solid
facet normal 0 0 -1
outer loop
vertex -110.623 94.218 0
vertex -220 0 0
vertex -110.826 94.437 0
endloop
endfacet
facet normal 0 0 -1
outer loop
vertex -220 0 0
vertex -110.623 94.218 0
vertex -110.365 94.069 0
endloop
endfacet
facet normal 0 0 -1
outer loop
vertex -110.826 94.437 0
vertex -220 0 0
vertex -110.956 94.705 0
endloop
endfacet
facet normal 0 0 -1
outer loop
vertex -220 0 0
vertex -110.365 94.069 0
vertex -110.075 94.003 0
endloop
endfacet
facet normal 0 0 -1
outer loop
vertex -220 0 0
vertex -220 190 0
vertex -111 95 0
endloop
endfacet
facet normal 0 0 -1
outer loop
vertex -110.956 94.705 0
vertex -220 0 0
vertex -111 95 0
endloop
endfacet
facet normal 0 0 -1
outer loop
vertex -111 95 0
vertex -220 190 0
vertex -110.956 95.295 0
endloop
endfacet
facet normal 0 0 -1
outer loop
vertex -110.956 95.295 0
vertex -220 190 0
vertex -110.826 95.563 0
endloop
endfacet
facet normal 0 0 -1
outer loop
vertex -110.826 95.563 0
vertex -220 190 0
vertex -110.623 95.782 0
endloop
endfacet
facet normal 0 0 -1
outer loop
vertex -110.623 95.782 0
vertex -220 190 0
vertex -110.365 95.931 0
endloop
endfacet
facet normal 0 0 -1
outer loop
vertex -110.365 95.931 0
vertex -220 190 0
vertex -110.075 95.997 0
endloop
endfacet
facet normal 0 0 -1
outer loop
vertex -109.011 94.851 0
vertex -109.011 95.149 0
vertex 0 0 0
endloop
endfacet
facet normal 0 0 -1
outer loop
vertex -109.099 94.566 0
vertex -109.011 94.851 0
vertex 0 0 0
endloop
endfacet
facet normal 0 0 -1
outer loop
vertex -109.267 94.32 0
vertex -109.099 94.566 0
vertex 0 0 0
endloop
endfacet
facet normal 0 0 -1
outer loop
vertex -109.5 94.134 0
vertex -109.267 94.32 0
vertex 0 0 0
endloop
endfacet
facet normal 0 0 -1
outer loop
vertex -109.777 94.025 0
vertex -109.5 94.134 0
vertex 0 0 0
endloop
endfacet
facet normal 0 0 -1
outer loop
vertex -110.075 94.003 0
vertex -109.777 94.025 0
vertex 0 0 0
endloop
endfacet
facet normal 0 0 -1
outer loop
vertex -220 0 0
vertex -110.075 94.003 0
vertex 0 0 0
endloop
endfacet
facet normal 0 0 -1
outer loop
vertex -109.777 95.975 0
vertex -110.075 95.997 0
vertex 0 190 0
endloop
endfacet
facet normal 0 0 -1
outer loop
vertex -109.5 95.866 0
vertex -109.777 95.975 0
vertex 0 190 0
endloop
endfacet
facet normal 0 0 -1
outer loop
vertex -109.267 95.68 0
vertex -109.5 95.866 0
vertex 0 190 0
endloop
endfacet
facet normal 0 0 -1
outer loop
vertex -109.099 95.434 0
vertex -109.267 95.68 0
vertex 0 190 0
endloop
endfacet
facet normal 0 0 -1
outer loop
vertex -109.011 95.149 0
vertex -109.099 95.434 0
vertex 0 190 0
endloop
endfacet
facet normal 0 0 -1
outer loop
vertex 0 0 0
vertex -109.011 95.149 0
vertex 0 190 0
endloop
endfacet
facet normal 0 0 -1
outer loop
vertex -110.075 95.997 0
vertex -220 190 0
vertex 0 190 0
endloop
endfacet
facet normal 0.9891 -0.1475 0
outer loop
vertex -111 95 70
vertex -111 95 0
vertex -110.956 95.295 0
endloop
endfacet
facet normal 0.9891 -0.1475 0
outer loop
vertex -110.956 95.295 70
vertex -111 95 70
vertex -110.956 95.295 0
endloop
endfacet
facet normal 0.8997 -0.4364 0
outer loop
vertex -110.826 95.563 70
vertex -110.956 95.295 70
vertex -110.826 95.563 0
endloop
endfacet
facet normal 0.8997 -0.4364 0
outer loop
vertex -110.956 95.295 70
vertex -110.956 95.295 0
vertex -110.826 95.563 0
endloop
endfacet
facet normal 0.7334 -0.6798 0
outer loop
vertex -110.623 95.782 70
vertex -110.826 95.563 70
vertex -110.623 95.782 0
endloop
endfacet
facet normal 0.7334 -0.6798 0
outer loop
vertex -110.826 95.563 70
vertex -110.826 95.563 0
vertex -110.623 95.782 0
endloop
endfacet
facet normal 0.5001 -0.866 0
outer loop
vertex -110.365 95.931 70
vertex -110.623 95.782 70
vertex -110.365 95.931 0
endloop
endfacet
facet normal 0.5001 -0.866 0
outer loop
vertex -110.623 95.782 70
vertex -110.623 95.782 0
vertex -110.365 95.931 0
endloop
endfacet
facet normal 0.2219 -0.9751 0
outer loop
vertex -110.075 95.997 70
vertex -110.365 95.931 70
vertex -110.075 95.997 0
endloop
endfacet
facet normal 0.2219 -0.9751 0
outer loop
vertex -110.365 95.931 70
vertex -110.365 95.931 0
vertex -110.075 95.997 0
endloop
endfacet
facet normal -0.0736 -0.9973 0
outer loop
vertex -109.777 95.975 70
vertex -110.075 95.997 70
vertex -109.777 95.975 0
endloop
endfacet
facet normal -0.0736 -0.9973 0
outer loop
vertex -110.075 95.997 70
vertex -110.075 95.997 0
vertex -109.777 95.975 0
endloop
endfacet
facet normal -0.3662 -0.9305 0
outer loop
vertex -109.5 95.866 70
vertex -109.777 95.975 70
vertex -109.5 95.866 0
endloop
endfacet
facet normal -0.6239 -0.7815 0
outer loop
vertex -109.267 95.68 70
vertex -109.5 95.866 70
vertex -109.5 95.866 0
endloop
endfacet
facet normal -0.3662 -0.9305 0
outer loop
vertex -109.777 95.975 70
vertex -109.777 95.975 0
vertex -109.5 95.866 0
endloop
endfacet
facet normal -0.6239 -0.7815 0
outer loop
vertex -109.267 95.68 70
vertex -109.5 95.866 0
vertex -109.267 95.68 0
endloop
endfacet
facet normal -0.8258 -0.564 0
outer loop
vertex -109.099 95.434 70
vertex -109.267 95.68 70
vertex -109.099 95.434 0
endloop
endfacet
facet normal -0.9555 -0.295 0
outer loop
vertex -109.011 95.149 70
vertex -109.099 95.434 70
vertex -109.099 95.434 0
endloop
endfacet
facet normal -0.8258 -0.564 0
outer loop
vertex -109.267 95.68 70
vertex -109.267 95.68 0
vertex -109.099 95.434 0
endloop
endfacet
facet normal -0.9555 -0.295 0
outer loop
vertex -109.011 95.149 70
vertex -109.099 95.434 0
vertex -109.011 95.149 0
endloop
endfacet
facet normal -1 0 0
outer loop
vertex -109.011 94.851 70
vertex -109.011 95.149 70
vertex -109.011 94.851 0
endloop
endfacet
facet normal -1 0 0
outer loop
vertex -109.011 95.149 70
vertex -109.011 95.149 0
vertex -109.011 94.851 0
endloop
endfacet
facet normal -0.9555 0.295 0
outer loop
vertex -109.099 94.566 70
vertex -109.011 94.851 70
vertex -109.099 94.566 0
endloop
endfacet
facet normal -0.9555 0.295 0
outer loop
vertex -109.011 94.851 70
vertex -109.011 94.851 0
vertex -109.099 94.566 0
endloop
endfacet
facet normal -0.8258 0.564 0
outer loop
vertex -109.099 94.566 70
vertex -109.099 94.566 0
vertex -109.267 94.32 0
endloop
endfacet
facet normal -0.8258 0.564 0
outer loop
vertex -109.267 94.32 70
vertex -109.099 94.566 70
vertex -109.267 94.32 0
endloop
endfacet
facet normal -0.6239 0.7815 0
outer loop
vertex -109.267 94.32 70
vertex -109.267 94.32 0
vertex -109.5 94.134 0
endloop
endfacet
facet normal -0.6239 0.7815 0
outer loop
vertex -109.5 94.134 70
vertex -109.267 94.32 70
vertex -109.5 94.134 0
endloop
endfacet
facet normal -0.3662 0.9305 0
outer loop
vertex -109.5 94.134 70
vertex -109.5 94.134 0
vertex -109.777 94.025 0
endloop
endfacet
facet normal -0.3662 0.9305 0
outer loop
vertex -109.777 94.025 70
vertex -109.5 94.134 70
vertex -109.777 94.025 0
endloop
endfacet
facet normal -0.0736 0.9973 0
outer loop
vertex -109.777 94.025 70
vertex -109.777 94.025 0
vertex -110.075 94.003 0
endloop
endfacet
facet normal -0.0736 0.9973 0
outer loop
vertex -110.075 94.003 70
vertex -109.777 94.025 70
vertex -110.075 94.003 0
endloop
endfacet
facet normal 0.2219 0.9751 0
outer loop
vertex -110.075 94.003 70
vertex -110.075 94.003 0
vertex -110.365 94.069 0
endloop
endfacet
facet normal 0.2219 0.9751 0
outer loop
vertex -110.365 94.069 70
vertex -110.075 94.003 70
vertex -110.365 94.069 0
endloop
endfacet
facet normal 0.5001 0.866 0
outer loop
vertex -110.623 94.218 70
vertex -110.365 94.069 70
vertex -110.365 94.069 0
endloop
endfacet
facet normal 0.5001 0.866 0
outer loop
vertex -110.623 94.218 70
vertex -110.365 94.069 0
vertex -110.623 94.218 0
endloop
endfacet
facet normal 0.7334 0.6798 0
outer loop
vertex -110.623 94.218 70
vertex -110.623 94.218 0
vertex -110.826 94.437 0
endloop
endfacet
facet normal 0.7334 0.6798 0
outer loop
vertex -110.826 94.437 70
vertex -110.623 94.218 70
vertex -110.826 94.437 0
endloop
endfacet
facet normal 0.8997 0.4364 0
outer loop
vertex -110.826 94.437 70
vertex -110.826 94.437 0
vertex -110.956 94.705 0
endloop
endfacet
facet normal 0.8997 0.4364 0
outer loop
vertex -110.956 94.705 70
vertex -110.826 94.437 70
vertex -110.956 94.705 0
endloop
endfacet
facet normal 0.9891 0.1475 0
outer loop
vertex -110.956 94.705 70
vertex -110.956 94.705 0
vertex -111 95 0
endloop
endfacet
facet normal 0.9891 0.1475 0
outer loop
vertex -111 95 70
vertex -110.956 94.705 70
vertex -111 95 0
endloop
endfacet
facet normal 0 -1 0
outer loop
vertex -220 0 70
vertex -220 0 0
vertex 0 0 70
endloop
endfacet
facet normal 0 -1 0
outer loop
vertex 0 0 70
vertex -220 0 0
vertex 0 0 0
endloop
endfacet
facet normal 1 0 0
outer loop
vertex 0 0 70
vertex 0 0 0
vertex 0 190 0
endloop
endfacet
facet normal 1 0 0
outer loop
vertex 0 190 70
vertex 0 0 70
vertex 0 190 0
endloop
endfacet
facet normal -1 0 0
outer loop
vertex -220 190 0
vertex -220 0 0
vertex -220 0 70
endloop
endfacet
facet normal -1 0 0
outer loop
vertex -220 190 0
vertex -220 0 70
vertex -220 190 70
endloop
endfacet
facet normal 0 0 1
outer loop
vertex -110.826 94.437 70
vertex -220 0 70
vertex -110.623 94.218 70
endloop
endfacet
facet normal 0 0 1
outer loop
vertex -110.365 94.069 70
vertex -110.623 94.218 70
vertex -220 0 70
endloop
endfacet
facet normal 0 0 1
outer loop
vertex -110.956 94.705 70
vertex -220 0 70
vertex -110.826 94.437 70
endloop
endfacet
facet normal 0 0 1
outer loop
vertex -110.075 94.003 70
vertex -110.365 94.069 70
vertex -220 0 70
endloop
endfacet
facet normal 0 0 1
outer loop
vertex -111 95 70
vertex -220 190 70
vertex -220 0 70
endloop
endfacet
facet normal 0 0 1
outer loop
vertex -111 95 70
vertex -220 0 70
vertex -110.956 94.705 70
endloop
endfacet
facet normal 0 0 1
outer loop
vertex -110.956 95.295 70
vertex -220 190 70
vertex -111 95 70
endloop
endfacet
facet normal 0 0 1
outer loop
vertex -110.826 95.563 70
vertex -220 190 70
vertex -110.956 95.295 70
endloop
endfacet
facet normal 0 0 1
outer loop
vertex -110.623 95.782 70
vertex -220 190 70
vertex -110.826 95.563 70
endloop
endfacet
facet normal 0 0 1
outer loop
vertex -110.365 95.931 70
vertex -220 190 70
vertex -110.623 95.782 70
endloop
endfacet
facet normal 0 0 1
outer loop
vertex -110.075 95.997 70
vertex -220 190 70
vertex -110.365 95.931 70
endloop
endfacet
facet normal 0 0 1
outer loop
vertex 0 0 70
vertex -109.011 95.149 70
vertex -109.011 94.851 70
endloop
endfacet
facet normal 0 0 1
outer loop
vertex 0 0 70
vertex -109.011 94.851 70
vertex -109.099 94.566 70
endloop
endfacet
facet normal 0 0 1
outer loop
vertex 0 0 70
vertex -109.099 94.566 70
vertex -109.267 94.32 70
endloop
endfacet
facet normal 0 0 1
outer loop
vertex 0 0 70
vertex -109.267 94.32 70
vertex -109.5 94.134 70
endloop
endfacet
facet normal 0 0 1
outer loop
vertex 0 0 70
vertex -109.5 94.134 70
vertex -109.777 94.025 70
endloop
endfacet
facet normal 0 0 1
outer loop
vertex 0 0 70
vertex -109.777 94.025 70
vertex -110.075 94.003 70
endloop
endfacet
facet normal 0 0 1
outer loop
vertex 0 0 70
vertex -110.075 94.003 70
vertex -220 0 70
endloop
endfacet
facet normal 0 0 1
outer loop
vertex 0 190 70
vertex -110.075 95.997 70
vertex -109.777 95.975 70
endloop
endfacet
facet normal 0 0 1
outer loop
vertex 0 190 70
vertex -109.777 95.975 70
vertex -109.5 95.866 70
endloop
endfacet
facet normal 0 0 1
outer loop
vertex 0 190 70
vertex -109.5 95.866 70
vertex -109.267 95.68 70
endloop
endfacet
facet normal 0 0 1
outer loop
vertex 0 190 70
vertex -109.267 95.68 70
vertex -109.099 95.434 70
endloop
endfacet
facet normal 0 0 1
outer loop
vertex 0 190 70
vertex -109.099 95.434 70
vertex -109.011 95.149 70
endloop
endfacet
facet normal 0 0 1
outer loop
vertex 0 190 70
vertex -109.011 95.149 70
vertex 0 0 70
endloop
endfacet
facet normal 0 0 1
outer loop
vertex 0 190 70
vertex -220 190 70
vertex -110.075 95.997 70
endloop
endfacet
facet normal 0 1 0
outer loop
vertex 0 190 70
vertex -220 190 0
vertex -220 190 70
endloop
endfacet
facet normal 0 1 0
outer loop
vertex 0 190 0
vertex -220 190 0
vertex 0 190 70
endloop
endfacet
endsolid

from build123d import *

# Parameters (mm, degrees)
ESQUISSE1_W                  = 220
ESQUISSE1_H                  = 190
BOSS_EXTRU_1_DEPTH           = 70
ESQUISSE2_R                  = 1
ENL_V_MAT_EXTRU_1_DEPTH      = 10
ENL_V_MAT_EXTRU_1_DEPTH_BACK = 119


with BuildPart() as part:
    # Esquisse1 → Boss.-Extru.1 (new body)
    with BuildSketch(Plane.XY):
        with Locations((-110, 95)):
            Rectangle(ESQUISSE1_W, ESQUISSE1_H)
    extrude(amount=BOSS_EXTRU_1_DEPTH)

    # Esquisse2 → Enlèv. mat.-Extru.1 (cut, two sides)
    with BuildSketch(Plane(origin=(0, 0, 0), x_dir=(-1, 0, 0), z_dir=(0, 0, -1))) as enl_v_mat_extru_1_sk:
        with Locations((110, 95)):
            Circle(ESQUISSE2_R)
    extrude(amount=ENL_V_MAT_EXTRU_1_DEPTH, mode=Mode.SUBTRACT)
    extrude(enl_v_mat_extru_1_sk.sketch, amount=-ENL_V_MAT_EXTRU_1_DEPTH_BACK, mode=Mode.SUBTRACT)


solid = part.part
